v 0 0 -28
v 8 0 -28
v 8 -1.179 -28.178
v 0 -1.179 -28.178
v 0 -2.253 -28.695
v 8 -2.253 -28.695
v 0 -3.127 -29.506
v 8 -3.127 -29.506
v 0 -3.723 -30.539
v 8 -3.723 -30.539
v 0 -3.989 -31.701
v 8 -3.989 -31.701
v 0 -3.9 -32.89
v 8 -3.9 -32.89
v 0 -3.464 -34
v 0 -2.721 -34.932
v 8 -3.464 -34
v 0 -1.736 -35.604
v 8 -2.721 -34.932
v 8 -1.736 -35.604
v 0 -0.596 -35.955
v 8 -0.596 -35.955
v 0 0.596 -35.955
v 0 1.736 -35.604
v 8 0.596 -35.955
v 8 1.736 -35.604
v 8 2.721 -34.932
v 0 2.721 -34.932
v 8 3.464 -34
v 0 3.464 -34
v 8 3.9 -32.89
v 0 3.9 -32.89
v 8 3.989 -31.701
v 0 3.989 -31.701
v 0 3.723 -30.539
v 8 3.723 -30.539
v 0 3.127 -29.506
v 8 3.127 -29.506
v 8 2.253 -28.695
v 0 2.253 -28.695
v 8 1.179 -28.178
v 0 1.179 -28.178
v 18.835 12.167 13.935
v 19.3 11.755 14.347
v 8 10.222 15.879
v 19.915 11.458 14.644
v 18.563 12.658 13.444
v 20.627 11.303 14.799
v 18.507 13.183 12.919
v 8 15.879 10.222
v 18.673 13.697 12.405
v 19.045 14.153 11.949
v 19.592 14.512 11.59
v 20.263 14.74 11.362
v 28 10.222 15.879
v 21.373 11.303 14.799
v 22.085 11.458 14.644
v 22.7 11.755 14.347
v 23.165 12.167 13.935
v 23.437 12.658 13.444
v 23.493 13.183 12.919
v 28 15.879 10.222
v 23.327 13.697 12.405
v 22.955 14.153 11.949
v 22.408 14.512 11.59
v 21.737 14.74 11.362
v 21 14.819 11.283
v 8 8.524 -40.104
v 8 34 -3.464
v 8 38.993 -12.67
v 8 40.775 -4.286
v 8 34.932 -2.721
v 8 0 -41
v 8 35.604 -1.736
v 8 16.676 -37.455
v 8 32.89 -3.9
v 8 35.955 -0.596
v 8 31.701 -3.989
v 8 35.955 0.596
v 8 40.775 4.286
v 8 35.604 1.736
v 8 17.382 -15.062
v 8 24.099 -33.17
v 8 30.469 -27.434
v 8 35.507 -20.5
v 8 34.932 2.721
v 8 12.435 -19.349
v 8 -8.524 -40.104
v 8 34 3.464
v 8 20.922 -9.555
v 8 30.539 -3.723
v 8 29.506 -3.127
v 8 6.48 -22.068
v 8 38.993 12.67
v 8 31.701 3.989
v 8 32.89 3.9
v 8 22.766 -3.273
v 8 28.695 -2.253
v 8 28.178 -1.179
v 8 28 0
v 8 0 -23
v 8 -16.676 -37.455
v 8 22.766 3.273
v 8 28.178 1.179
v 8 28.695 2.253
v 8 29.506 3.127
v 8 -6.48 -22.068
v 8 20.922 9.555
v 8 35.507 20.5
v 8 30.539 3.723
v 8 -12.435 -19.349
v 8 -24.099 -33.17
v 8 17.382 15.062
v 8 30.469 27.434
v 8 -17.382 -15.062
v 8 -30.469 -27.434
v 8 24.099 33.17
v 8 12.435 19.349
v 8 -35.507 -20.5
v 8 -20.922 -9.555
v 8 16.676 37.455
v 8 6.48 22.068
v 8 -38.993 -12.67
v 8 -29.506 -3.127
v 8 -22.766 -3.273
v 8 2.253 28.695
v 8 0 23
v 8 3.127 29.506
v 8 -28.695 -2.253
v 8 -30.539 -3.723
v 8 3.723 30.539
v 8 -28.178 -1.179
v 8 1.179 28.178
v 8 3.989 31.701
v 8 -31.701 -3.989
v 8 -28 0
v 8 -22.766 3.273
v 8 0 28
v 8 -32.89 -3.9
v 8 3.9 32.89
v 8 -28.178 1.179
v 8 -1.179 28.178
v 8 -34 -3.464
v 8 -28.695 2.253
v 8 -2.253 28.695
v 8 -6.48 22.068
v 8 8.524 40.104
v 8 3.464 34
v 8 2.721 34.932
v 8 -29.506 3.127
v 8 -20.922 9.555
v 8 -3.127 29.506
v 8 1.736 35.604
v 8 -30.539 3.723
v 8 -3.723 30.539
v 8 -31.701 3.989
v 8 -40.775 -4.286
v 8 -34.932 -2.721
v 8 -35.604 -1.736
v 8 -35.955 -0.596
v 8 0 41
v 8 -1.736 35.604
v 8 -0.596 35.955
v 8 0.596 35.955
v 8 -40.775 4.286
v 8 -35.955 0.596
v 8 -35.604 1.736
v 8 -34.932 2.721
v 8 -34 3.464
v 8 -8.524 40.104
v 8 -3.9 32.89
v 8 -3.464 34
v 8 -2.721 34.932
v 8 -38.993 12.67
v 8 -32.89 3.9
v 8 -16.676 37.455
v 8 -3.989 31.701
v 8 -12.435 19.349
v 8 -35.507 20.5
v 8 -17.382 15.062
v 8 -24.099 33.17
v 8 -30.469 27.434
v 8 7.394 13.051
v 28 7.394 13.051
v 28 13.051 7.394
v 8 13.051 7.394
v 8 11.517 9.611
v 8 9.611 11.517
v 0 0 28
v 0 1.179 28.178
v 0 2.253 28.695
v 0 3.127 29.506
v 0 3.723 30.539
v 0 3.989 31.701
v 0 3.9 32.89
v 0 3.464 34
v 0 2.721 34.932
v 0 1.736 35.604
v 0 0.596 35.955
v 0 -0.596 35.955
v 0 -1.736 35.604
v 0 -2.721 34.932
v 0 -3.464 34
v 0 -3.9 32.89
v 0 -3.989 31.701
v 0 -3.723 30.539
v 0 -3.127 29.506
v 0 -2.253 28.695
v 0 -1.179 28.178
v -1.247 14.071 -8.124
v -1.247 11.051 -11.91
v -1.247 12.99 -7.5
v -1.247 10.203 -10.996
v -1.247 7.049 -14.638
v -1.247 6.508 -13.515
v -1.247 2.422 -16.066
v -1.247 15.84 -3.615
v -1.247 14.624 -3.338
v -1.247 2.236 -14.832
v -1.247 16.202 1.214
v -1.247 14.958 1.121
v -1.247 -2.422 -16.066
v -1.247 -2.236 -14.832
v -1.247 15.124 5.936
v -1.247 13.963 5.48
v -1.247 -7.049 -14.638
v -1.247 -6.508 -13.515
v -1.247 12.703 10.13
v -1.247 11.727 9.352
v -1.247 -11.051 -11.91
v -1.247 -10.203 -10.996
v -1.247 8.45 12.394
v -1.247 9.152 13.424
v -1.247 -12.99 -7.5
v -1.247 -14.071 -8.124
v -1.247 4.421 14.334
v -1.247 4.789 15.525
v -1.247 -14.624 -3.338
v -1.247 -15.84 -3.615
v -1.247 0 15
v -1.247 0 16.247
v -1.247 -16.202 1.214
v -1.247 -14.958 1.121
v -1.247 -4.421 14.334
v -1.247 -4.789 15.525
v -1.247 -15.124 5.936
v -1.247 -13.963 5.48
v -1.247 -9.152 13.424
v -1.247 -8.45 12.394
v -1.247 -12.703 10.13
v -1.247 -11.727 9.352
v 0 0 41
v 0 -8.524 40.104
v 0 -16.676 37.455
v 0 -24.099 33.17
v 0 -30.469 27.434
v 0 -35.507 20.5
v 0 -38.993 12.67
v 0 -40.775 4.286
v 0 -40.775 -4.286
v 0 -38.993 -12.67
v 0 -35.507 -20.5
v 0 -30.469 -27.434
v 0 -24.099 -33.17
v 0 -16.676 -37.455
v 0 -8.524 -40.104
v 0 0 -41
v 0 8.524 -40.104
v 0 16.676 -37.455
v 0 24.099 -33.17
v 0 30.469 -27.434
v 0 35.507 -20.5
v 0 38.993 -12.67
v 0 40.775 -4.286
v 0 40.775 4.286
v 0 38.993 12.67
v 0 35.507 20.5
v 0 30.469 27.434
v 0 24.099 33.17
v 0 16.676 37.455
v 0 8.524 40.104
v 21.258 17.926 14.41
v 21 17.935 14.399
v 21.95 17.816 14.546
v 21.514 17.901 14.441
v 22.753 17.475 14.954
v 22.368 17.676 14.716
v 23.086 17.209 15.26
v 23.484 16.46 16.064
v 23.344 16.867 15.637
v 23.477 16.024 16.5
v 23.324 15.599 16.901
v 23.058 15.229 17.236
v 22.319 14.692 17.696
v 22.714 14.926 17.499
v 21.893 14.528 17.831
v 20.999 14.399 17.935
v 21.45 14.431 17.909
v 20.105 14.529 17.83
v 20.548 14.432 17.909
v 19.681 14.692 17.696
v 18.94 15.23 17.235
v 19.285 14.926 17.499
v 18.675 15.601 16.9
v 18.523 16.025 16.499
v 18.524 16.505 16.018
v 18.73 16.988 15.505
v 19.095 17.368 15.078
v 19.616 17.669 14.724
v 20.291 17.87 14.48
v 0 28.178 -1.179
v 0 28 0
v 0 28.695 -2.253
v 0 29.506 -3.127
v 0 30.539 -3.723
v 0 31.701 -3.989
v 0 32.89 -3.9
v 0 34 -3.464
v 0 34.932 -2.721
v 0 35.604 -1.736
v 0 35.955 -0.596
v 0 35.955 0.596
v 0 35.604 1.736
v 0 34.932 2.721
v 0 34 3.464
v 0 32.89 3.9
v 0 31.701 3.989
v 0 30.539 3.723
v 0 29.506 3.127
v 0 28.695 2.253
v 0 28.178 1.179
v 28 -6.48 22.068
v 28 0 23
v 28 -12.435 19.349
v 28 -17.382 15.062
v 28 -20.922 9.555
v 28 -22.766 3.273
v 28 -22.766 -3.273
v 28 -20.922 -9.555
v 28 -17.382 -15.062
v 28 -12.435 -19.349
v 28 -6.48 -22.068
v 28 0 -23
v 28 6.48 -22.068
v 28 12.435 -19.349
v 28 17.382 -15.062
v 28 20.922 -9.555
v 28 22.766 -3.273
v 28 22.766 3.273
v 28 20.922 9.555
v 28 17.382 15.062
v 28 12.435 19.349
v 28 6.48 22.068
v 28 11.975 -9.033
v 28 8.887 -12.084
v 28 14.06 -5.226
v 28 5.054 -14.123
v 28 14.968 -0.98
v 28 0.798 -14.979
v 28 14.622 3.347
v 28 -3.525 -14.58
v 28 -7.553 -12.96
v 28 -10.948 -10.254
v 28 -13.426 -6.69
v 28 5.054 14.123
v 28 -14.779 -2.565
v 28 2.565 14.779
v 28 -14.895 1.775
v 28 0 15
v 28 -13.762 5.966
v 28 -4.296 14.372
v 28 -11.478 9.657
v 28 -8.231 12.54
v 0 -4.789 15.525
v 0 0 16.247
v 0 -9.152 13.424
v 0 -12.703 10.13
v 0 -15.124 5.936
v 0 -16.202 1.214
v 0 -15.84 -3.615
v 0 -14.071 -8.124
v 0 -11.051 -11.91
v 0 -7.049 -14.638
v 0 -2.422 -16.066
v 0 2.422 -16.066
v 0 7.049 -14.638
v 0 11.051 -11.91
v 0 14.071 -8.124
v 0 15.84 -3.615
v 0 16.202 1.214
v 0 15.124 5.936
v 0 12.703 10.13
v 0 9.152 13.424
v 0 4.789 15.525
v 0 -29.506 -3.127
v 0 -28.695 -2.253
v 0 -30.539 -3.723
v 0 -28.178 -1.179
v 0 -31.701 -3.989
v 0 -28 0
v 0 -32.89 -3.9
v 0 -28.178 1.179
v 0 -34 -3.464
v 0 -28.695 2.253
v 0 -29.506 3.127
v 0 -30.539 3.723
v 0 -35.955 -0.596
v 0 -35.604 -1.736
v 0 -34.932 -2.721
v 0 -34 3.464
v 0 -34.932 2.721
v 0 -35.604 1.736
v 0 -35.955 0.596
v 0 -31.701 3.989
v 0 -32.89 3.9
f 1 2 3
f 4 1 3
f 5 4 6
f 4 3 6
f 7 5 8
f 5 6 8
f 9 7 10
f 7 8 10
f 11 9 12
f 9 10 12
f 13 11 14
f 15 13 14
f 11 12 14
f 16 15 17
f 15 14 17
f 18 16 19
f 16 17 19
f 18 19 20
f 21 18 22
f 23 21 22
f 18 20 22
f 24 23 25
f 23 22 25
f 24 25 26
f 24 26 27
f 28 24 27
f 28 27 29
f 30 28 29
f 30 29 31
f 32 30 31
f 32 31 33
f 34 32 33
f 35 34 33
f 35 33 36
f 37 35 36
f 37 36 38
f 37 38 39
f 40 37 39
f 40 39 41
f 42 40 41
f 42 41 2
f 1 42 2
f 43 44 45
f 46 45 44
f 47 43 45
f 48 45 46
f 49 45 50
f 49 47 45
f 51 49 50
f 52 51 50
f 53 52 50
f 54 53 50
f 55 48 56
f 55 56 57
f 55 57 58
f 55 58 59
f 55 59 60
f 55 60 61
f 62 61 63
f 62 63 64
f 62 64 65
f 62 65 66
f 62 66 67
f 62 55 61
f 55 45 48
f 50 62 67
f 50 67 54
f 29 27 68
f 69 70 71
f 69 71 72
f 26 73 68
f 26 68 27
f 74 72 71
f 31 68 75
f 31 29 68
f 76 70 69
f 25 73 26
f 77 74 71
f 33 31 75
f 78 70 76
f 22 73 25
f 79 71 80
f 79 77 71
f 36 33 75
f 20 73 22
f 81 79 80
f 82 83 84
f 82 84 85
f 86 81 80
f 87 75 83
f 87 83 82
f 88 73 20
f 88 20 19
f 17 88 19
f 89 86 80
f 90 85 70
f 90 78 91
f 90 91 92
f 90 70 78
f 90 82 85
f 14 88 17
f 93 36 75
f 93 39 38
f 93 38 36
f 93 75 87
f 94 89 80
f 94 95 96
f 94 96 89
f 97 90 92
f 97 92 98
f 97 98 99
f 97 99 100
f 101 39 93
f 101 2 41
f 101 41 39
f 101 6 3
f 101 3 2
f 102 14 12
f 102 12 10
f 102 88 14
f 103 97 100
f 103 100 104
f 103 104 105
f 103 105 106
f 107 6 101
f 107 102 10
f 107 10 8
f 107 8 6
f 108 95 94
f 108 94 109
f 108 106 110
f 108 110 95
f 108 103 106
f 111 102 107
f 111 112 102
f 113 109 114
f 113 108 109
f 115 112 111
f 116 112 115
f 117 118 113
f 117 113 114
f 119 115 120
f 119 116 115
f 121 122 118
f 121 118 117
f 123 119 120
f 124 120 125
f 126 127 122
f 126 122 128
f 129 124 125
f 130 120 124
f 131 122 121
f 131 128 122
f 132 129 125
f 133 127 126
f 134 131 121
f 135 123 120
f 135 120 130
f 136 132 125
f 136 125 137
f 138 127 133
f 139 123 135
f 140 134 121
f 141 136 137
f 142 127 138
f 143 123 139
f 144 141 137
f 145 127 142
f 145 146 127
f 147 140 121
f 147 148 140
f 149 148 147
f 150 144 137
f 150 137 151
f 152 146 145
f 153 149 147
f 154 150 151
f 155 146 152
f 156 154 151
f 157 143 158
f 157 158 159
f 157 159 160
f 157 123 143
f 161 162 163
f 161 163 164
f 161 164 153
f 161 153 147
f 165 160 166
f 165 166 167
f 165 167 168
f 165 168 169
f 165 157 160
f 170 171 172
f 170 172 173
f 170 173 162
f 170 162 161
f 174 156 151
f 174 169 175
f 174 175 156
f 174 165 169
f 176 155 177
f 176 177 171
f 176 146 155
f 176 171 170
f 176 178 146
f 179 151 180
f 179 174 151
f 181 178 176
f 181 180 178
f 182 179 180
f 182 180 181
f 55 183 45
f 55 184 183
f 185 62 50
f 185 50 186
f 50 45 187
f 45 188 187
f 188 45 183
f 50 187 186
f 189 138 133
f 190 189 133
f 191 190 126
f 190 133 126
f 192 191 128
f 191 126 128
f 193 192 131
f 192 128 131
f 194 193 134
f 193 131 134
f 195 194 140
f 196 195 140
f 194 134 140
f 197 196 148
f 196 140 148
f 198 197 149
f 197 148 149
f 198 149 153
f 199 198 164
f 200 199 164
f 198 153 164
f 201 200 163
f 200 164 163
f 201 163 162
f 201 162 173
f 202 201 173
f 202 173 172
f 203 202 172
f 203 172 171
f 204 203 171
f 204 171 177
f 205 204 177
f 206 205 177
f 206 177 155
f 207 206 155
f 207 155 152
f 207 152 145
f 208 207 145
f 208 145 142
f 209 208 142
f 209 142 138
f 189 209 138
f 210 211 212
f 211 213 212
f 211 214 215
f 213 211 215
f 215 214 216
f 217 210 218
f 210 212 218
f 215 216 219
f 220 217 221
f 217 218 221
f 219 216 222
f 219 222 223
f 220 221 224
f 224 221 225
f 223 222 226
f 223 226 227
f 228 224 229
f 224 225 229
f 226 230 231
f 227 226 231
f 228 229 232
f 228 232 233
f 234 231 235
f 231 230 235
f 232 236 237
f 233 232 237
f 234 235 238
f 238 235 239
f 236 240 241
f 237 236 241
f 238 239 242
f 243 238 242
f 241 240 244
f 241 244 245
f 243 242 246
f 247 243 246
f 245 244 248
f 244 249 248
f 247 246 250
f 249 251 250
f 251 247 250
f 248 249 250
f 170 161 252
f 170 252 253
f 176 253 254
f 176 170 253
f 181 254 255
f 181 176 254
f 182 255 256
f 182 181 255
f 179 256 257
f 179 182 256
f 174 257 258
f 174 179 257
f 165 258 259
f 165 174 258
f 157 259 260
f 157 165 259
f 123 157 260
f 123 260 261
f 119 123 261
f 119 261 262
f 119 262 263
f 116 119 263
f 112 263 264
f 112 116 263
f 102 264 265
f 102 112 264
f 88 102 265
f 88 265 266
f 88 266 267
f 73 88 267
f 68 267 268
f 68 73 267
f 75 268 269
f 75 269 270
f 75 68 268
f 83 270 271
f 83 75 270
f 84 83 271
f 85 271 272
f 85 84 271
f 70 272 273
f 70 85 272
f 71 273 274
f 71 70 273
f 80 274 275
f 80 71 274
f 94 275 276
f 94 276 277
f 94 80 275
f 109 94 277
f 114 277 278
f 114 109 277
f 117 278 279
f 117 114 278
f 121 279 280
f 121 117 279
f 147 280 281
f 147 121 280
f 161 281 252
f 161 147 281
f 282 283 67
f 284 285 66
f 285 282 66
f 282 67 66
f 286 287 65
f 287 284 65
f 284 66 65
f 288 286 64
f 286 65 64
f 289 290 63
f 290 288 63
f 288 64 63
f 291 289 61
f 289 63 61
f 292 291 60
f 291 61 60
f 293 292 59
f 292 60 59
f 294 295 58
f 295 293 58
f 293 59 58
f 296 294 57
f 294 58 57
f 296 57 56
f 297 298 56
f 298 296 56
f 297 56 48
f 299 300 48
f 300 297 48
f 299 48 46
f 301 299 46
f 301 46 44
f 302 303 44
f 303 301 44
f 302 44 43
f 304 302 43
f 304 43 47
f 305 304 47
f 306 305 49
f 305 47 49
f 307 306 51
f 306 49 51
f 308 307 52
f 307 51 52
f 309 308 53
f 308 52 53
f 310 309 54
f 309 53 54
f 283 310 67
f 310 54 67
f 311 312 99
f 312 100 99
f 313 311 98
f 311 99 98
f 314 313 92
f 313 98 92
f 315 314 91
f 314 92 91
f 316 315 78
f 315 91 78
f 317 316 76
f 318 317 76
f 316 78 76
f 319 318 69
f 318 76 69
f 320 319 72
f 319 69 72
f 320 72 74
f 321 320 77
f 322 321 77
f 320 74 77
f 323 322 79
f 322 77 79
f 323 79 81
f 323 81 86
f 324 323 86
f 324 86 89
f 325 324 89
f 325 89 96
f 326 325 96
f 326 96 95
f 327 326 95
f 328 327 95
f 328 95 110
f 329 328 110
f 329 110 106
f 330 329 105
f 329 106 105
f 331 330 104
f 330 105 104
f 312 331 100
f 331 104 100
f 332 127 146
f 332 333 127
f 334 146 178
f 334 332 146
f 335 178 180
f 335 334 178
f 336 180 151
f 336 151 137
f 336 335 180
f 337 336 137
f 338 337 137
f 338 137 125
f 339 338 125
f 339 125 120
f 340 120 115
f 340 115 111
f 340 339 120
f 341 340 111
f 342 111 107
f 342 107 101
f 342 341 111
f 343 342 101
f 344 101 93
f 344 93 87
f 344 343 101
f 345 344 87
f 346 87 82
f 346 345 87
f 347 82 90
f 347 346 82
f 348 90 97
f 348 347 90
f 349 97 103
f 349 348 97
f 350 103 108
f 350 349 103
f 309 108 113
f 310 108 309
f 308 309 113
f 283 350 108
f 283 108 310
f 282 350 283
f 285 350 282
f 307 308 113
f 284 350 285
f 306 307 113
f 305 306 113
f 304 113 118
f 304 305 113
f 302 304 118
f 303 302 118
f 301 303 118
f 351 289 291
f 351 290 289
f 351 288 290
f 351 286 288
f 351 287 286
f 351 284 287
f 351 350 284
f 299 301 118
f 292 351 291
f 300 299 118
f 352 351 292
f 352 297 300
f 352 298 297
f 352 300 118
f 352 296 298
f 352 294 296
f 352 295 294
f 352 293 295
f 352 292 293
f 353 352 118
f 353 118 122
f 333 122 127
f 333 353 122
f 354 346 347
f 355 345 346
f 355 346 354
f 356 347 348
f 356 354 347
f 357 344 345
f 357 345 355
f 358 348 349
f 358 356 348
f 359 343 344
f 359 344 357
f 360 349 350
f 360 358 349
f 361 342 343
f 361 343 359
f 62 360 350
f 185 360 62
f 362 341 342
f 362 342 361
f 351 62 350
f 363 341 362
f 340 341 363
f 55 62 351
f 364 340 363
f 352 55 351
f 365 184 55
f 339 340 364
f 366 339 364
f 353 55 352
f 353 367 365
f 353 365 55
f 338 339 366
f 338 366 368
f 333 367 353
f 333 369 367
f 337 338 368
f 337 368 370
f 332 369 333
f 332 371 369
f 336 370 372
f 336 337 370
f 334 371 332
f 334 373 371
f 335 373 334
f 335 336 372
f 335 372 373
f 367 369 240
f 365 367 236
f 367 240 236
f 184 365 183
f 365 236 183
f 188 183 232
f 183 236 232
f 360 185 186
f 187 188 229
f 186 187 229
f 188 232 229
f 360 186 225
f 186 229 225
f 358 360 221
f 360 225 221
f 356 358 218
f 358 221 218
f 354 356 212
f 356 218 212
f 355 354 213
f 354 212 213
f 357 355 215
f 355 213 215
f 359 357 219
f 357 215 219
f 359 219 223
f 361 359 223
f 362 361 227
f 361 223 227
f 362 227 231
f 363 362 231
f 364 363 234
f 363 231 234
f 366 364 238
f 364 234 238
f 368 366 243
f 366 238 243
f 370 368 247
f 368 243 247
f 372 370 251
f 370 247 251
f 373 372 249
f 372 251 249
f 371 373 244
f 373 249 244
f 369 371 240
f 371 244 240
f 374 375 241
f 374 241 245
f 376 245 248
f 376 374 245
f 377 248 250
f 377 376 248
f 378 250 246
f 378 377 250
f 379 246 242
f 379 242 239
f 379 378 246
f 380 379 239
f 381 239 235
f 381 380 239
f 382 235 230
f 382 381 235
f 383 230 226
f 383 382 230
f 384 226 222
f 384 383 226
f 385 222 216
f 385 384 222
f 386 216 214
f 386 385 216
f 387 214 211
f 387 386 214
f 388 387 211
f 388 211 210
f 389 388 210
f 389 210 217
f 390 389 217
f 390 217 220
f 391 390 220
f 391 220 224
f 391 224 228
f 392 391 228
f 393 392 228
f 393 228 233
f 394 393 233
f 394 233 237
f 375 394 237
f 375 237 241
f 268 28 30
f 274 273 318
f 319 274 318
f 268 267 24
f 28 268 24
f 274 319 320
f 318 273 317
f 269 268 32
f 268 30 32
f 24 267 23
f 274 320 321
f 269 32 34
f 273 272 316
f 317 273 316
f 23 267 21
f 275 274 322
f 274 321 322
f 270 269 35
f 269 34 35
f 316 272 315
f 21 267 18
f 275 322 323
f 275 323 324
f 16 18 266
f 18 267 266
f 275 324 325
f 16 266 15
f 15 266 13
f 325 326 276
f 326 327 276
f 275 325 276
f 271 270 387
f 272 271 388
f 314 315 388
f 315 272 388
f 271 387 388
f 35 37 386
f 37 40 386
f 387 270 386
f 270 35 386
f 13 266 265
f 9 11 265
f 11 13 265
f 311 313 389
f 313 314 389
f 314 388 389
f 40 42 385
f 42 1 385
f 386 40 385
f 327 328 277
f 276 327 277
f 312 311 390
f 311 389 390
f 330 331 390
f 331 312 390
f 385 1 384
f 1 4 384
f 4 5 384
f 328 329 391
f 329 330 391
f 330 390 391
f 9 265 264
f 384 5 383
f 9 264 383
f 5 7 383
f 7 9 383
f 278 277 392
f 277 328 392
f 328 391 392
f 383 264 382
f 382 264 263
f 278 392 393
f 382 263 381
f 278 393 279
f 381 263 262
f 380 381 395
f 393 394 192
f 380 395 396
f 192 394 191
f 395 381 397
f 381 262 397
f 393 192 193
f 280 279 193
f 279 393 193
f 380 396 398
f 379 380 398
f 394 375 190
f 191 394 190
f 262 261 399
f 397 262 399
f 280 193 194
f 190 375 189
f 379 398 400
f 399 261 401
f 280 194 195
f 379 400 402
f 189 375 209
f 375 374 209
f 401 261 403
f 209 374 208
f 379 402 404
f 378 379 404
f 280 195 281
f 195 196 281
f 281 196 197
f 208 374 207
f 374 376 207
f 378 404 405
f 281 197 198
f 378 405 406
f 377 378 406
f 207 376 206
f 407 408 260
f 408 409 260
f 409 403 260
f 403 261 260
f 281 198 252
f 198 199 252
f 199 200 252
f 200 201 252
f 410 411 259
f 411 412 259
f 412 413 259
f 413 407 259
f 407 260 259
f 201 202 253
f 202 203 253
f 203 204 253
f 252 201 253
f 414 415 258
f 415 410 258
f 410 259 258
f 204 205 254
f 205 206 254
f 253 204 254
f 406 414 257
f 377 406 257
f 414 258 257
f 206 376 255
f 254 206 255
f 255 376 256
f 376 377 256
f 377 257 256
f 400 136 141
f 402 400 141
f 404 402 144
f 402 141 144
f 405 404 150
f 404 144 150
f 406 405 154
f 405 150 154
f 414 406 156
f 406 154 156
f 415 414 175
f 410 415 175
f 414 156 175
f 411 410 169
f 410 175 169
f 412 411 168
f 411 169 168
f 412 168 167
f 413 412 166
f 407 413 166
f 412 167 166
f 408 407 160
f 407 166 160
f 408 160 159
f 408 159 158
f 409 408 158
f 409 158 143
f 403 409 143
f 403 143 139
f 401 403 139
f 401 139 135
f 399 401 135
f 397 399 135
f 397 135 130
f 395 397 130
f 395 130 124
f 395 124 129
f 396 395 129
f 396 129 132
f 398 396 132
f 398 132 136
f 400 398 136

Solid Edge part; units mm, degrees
sketch "Sketch1" plane through (0, 0, 0) normal (0, -1, 0) x (1, 0, 0)
  line L0 (0, 15) -> (0, 41)
  line L1 (0, 41) -> (8, 41)
  line L2 (8, 41) -> (8, 23)
  line L3 (8, 23) -> (28, 23)
  line L4 (28, 23) -> (28, 15)
  line L5 (28, 15) -> (0, 15)
  dimension "D1" = 15
  dimension "D2" = 26
  dimension "D3" = 8
  dimension "D4" = 8
  dimension "D5" = 20
revolve "RevolvedProtrusion1" add sketch "Sketch1" angle 360 about axis through (0, 0, 0) along (1, 0, 0)
hole "Hole1" at (8, 0, 32) direction (-1, 0, 0) diameter 8 end up to next
pattern_circular "Pattern2" count 4 over 360 about axis through (8, 0, 0) along (-1, 0, 0) of "Hole1"
sketch "Sketch2" plane through (28, 0, 0) normal (1, 0, 0) x (0, 1, 0)
  line L0 (7.3941, 13.051) -> (10.2225, 15.8794)
  line L1 (10.2225, 15.8794) -> (15.8794, 10.2225)
  line L2 (15.8794, 10.2225) -> (13.051, 7.3941)
  line L3 (13.051, 7.3941) -> (7.3941, 13.051)
  dimension "D1" = 8
  dimension "D2" = 4
extrude "Cutout1" cut sketch "Sketch2" against normal up to vertex (20 mm away)
sketch "Sketch3" plane through (0, 0, 0) normal (0, 1, 0) x (-1, 0, 0)
  line L0 (0, 15) -> (1.2473, 15)
  line L1 (1.2473, 15) -> (1.2473, 16.2473)
  line L2 (1.2473, 16.2473) -> (0, 16.2473)
  line L3 (0, 16.2473) -> (0, 15)
  dimension "D1" = 1.2473
revolve "RevolvedProtrusion2" add sketch "Sketch3" angle 360 about axis through (0, 0, 0) along (1, 0, 0)
hole "Hole2" at (21, 13.051, 13.051) direction (0, 0.7071068, 0.7071068) diameter 5 end up to next
properties material "Steel"
